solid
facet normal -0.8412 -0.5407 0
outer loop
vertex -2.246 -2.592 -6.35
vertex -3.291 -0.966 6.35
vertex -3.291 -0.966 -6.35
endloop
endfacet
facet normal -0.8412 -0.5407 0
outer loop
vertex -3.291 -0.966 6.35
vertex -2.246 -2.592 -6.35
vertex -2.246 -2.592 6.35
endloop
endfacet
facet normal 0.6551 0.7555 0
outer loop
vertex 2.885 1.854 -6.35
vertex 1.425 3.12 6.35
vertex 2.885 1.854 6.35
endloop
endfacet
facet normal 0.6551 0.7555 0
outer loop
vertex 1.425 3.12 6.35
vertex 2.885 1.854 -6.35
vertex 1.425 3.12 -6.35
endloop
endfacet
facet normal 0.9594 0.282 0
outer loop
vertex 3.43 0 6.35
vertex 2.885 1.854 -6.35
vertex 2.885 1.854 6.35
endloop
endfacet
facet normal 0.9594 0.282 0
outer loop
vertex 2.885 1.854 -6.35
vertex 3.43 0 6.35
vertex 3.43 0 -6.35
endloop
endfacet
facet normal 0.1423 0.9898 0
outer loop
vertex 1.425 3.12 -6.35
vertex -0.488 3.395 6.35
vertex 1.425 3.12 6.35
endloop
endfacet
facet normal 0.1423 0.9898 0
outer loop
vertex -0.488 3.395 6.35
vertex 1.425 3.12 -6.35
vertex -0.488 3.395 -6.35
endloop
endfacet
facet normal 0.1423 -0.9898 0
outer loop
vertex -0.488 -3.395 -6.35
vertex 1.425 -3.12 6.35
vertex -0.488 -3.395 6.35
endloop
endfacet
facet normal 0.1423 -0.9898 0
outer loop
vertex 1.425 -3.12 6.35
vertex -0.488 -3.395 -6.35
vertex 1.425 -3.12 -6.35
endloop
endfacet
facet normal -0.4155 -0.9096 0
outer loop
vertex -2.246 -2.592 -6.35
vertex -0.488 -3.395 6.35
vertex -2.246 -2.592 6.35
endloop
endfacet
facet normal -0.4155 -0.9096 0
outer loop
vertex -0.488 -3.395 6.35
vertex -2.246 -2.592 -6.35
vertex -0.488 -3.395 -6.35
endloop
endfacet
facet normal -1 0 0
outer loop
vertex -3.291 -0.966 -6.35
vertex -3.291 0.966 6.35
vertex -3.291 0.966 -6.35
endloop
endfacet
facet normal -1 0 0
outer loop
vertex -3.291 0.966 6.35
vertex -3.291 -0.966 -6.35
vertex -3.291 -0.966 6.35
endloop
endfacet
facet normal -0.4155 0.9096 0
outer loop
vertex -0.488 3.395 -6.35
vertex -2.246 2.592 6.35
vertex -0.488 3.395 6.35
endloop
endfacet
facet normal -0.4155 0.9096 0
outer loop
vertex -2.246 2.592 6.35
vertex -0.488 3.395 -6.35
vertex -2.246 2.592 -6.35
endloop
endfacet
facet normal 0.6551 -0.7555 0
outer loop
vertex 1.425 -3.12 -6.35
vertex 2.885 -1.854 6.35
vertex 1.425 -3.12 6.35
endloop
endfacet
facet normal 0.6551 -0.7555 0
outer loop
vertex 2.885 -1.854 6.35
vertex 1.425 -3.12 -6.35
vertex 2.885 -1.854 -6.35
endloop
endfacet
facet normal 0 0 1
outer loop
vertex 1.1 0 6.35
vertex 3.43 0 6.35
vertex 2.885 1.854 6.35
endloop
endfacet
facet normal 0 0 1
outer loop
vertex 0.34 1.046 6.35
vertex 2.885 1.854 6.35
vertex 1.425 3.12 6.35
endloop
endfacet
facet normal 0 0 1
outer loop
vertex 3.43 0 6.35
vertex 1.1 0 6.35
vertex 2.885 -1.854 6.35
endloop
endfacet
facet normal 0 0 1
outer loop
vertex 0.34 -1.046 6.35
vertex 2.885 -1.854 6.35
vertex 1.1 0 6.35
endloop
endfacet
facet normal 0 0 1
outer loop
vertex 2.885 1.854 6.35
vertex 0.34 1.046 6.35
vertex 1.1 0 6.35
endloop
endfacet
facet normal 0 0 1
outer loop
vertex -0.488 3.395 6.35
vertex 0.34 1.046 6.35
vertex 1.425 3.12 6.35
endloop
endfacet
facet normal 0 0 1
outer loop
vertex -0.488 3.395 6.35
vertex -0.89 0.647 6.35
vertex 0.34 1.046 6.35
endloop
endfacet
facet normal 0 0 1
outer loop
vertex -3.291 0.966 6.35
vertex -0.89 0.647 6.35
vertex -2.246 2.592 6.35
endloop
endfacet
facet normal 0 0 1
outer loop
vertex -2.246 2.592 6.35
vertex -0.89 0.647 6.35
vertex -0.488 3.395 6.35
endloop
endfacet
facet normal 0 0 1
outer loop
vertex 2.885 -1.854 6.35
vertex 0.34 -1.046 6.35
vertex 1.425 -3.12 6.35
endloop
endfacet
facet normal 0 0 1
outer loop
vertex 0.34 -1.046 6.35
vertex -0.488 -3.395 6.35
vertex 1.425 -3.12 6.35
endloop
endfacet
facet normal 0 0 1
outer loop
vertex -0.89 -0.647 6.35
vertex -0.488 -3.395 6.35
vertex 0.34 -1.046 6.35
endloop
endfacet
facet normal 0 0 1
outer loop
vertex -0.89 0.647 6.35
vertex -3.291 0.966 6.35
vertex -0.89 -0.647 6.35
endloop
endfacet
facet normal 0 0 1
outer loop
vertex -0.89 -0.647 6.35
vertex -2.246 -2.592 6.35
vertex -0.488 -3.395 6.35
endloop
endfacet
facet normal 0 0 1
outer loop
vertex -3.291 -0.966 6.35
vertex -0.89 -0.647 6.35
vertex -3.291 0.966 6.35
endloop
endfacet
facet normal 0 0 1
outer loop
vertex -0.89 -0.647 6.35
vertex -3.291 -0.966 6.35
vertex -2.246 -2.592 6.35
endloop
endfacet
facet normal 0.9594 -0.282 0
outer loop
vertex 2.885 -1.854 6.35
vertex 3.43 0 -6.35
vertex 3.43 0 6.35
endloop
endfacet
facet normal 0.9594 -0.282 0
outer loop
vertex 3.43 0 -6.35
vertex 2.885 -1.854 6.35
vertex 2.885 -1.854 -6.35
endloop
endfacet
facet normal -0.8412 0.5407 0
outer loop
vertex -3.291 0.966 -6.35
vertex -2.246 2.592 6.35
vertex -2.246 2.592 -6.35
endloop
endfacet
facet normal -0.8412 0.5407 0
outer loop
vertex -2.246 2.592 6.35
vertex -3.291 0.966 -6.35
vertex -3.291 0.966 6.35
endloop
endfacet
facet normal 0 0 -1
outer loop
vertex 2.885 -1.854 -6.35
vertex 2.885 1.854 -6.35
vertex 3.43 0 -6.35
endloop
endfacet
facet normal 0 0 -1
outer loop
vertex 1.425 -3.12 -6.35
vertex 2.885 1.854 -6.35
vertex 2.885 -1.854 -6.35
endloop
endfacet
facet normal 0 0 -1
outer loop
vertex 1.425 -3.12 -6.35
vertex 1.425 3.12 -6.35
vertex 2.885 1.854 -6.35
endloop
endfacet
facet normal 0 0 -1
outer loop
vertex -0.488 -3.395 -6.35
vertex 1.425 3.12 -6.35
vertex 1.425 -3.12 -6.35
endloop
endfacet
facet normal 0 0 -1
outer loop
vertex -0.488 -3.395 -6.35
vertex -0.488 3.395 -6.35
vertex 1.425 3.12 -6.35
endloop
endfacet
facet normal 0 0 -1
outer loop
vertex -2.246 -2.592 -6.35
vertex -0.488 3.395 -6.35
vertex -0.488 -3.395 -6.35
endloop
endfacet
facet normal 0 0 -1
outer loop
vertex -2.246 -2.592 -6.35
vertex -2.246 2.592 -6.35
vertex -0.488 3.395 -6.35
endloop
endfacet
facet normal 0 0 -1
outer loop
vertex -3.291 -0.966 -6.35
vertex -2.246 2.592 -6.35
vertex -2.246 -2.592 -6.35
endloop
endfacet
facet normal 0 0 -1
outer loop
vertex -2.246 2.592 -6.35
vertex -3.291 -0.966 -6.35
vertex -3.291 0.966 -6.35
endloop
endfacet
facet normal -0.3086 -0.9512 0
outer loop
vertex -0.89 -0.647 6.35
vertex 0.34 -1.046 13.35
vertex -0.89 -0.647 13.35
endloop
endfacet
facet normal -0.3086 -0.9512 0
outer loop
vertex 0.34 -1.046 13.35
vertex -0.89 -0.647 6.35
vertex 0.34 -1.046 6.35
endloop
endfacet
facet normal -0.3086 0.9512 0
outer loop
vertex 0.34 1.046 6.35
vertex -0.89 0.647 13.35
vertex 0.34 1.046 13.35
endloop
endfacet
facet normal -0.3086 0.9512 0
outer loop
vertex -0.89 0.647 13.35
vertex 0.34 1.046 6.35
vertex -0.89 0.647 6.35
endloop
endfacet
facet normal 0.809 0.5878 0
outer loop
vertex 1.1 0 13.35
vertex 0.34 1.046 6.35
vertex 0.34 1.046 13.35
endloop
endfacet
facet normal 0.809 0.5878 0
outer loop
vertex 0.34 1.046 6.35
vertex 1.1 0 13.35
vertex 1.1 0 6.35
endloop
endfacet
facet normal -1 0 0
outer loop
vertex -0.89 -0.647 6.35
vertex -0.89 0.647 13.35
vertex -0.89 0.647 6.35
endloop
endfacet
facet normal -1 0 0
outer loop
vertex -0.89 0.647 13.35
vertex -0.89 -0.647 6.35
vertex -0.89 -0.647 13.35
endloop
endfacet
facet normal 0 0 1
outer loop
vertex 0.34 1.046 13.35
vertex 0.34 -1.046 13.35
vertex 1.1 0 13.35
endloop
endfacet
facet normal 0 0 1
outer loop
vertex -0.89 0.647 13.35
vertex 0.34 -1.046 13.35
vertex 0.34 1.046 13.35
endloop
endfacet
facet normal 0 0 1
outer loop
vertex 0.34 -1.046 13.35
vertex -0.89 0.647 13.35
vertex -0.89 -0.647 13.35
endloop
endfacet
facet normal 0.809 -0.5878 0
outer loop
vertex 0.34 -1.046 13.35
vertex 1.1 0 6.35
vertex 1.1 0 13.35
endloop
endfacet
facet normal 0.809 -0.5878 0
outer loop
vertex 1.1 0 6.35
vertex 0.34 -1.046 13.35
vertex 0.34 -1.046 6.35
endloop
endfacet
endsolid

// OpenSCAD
// Parameters
body_diameter_mm = 6.86; //[3.43:13.72:0.01]
body_height_mm = 12.7; //[6.35:25.4:0.01]
face_thickness_mm = 0.8; //[0.4:1.6:0.05]
face_overlap_mm = 0.8; //[0.5:2:0.05]
toggle_shaft_diameter_mm = 2.2; //[1.1:4.4:0.05]
toggle_shaft_height_mm = 8; //[4:16:0.1]
toggle_overlap_mm = 1; //[0.5:2:0.05]

// Toggle switch body
module toggle_switch_body() {
  color("DimGray") {
    // Main body cylinder
    cylinder(h=body_height_mm, r=body_diameter_mm/2, center=true);
    
    // Top face
    translate([0, 0, body_height_mm/2 - face_thickness_mm/2 - face_overlap_mm/2])
      cylinder(h=face_thickness_mm, r=body_diameter_mm/2, center=true);
    
    // Bottom face
    translate([0, 0, -body_height_mm/2 + face_thickness_mm/2 + face_overlap_mm/2])
      cylinder(h=face_thickness_mm, r=body_diameter_mm/2, center=true);
  }
}

// Toggle lever
module toggle() {
  color("Silver") {
    translate([0, 0, body_height_mm/2 + toggle_shaft_height_mm/2 - toggle_overlap_mm])
      cylinder(h=toggle_shaft_height_mm, r=toggle_shaft_diameter_mm/2, center=true);
  }
}

// Assembly
module assembly() {
  toggle_switch_body();
  toggle();
}

assembly();
